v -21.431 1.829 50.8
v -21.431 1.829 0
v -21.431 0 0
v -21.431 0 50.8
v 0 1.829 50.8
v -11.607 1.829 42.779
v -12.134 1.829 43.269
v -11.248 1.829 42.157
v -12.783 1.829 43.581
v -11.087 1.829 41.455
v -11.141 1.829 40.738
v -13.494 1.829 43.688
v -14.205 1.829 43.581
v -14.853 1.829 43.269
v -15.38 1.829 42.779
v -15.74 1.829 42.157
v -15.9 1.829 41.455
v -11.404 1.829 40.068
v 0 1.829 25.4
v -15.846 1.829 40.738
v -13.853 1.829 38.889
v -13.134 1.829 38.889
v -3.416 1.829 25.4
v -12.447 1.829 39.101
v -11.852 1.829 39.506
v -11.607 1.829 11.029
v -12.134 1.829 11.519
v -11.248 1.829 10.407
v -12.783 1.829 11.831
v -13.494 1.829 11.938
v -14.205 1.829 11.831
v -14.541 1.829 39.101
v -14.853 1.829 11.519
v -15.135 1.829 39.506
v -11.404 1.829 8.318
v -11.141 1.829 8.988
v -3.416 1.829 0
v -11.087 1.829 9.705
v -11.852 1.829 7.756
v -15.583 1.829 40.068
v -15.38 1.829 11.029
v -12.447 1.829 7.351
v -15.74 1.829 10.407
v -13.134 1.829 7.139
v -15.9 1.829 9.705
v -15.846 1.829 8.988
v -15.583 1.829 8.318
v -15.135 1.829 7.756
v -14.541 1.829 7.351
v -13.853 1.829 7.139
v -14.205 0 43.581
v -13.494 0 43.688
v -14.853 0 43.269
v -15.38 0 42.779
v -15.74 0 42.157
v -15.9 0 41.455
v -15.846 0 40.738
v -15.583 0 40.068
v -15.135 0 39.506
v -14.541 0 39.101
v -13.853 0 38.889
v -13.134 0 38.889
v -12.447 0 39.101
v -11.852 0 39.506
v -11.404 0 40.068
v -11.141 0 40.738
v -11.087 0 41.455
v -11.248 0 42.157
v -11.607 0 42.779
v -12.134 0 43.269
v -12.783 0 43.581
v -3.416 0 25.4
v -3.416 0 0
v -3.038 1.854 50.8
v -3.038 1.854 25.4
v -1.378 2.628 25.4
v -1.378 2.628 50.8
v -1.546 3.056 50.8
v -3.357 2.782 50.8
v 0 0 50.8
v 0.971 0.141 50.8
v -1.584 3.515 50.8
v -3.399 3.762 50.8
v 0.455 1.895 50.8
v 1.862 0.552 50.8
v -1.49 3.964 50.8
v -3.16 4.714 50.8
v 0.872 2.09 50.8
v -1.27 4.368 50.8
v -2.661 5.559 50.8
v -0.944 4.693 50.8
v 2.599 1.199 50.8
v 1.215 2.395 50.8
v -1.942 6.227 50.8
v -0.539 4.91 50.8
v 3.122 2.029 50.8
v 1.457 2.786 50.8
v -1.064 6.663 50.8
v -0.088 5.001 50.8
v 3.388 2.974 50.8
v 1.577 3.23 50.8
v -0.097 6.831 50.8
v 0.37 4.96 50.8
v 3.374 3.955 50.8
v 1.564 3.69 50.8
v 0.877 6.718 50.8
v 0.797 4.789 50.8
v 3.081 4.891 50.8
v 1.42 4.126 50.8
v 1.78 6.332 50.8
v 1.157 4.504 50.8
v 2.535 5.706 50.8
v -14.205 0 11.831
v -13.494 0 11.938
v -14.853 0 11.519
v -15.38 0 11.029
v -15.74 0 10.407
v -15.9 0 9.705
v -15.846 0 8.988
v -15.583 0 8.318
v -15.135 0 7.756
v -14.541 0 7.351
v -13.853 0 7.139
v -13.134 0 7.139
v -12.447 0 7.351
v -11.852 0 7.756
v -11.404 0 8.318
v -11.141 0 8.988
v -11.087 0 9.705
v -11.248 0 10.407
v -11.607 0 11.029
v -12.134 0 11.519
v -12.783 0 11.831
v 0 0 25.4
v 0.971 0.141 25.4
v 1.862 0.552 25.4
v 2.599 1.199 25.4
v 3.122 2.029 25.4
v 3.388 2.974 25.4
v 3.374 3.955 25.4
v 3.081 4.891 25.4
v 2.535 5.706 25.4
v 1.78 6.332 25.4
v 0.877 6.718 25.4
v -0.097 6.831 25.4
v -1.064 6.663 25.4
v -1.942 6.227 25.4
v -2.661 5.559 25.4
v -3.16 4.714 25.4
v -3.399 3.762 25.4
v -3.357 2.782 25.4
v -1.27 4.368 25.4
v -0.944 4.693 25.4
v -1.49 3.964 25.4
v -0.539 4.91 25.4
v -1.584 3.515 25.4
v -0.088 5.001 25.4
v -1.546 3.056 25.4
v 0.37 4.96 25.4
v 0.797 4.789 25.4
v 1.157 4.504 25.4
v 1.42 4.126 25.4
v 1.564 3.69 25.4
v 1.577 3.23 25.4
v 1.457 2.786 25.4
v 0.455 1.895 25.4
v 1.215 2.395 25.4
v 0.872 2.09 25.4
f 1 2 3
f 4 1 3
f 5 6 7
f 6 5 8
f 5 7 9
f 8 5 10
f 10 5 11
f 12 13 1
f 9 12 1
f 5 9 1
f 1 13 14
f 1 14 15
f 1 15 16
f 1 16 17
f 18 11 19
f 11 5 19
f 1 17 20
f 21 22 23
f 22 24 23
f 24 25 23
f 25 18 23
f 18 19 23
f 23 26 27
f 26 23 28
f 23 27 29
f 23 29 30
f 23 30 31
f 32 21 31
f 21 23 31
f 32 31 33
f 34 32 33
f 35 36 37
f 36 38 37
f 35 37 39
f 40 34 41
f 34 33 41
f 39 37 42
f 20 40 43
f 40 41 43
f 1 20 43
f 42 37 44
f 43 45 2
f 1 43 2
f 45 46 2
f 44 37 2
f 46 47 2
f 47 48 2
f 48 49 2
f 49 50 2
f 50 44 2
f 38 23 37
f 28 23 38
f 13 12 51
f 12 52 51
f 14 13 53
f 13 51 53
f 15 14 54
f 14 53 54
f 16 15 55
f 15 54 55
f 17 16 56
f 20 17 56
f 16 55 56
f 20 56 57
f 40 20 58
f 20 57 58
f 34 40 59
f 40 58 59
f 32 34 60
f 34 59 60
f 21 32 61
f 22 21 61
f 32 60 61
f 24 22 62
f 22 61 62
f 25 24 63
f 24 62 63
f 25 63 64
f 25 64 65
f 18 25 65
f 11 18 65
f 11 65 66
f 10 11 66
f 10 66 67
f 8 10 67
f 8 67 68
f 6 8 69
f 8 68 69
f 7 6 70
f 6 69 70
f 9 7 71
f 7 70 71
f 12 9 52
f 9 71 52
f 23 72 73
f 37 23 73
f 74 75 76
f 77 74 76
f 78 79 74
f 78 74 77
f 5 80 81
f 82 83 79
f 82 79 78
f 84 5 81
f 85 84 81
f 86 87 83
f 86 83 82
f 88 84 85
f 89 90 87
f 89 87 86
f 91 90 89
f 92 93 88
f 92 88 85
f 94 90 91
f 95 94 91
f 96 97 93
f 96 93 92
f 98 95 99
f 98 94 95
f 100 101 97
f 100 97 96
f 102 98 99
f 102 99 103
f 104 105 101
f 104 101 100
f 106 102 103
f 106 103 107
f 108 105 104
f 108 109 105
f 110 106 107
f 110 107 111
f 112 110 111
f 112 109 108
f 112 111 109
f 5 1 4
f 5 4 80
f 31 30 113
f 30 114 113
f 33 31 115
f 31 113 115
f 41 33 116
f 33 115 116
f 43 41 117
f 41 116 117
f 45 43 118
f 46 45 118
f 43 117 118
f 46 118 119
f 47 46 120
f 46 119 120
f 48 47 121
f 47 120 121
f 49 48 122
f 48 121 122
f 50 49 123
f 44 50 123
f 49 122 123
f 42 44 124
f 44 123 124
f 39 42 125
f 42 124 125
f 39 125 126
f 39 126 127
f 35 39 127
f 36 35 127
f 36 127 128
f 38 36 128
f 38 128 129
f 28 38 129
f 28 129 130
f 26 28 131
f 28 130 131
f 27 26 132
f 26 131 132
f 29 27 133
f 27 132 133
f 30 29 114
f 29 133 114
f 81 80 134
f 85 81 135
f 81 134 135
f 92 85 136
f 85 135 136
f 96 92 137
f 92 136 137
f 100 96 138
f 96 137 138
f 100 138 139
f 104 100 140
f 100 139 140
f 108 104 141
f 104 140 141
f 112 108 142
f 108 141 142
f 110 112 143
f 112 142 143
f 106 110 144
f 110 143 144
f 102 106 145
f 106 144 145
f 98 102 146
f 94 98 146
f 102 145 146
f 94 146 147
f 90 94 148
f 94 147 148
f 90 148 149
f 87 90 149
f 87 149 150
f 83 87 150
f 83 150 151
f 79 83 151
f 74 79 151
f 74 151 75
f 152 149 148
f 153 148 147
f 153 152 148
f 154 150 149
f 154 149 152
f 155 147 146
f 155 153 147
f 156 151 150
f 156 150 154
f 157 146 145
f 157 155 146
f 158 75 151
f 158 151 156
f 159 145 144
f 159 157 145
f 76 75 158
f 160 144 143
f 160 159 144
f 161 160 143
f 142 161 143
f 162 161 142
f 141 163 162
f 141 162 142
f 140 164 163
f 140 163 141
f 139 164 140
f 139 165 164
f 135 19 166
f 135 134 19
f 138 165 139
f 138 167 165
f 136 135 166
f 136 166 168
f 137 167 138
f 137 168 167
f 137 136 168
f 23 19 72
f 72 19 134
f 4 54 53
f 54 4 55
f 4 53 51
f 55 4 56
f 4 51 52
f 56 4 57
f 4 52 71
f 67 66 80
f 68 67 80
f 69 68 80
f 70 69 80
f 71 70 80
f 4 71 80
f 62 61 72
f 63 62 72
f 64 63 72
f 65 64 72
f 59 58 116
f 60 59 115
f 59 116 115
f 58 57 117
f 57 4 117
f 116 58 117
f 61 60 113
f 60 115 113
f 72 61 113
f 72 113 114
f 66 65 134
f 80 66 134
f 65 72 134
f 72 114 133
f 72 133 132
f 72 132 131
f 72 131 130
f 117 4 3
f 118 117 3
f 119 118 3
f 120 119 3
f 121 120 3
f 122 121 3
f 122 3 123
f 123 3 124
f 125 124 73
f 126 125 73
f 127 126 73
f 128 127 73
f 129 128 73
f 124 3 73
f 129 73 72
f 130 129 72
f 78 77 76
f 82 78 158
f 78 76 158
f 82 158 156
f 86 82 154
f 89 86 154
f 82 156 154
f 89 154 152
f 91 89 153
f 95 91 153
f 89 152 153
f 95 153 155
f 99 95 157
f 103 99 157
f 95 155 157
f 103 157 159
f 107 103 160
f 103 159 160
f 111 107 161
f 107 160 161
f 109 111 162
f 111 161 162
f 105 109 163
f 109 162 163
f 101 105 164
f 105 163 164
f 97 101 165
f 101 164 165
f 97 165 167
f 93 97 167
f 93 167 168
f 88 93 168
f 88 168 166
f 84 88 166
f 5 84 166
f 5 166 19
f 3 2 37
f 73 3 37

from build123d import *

# Parameters (mm, degrees)
EXTRUDE1_DEPTH                      = 50.8
SKETCH2_W                           = 6.8326
SKETCH2_H                           = 25.4
CUT_EXTRUDE6_DEPTH                  = 56.557383842
EXTRUDE2_DEPTH                      = 50.8
SKETCH4_W                           = 6.8326
SKETCH4_H                           = 25.4
CUT_EXTRUDE7_DEPTH                  = 56.557383842
SKETCH5_R                           = 1.5875
EXTRUDE3_DEPTH                      = 25.4
SKETCH12_W                          = 2.413
SKETCH12_H                          = 1.8288
F_8_0_199_DIAMETER_HOLE1_AT_2_COUNT = 2
F_8_0_199_DIAMETER_HOLE1_AT_2_PITCH = 26.9875
F_8_0_199_DIAMETER_HOLE1_AT_3_COUNT = 2
F_8_0_199_DIAMETER_HOLE1_AT_3_PITCH = 41.669985076
F_8_0_199_DIAMETER_HOLE1_AT_4_COUNT = 2
F_8_0_199_DIAMETER_HOLE1_AT_4_PITCH = 31.75


with BuildPart() as part:
    # Sketch1 → Extrude1 (new body)
    with BuildSketch(Plane.XY):
        with BuildLine():
            Line((-21.43125, 0), (0, 0))
            ThreePointArc((0, 0), (1.779677423, 6.332436821), (-3.038247732, 1.8542))
            Line((-3.038247732, 1.8542), (-1.378132955, 2.628324234))
            ThreePointArc((-1.378132955, 2.628324234), (0.796631885, 4.789447439), (0, 1.8288))
            Line((0, 1.8288), (-21.43125, 1.8288))
            Line((-21.43125, 1.8288), (-21.43125, 0))
        make_face()
    extrude(amount=EXTRUDE1_DEPTH)

    # Sketch2 → Cut-Extrude6 (cut, through all)
    with BuildSketch(Plane(origin=(0, 0, 0), x_dir=(1, 0, 0), z_dir=(0, 1, 0))):
        with Locations((0, -12.7)):
            Rectangle(SKETCH2_W, SKETCH2_H)
    extrude(amount=CUT_EXTRUDE6_DEPTH, mode=Mode.SUBTRACT)


with BuildPart() as body_2:
    # Sketch3 → Extrude2 (new body)
    with BuildSketch(Plane.XY):
        with BuildLine():
            Line((0, 0), (21.43125, 0))
            Line((21.43125, 0), (21.43125, 1.8288))
            Line((21.43125, 1.8288), (3.025053626, 1.8288))
            ThreePointArc((3.025053626, 1.8288), (-1.767445818, 6.339866481), (0, 0))
        make_face()
    extrude(amount=EXTRUDE2_DEPTH)

    # Sketch4 → Cut-Extrude7 (cut, through all)
    with BuildSketch(Plane(origin=(0, 0, 0), x_dir=(1, 0, 0), z_dir=(0, 1, 0))):
        with Locations((0, -38.1)):
            Rectangle(SKETCH4_W, SKETCH4_H)
    extrude(amount=CUT_EXTRUDE7_DEPTH, mode=Mode.SUBTRACT)


with BuildPart() as body_3:
    # Sketch5 → Extrude3 (new body)
    with BuildSketch(Plane(origin=(0, 0, 25.4), x_dir=(-1, 0, 0), z_dir=(0, 0, -1))):
        with Locations((0, 3.4163)):
            Circle(SKETCH5_R)
    extrude(amount=-EXTRUDE3_DEPTH)

    # Sketch9 → Cut-Revolve1 (revolve, cut)
    with BuildSketch(Plane(origin=(0, 3.4163, 0), x_dir=(-1, 0, 0), z_dir=(0, 1, 0)), mode=Mode.PRIVATE) as cut_revolve1_sk:
        Polygon((-0.3175, 50.8), (-1.5875, 49.53), (-1.5875, 50.8), align=None)
    revolve(cut_revolve1_sk.sketch.rotate(Axis((0, 3.4163, 25.4), (0, 0, -1)), 180), axis=Axis((0, 3.4163, 25.4), (0, 0, -1)), mode=Mode.SUBTRACT)


with BuildPart() as body_2_1:
    add(body_2.part)

    # Combine1: union body 3
    add(body_3.part)

    # Sketch12 → #8 (0.199) Diameter Hole1 (revolve, cut)
    with BuildSketch(Plane(origin=(13.49375, 1.8288, 9.525), x_dir=(0, 0, 1), z_dir=(1, 0, 0))):
        with Locations((1.2065, 0.9144)):
            Rectangle(SKETCH12_W, SKETCH12_H)
    f_8_0_199_diameter_hole1 = revolve(axis=Axis((13.49375, 8.1788, 9.525), (0, -1, 0)), mode=Mode.SUBTRACT)

    # #8 (0.199) Diameter Hole1 at 4: #8 (0.199) Diameter Hole1 ×2
    with Locations(*[(0, 0, i * F_8_0_199_DIAMETER_HOLE1_AT_4_PITCH) for i in range(1, F_8_0_199_DIAMETER_HOLE1_AT_4_COUNT)]):
        add(f_8_0_199_diameter_hole1, mode=Mode.SUBTRACT)


with BuildPart() as part_1:
    add(part.part)

    # #8 (0.199) Diameter Hole1 at 2: #8 (0.199) Diameter Hole1 ×2
    with Locations(*[(-i * F_8_0_199_DIAMETER_HOLE1_AT_2_PITCH, 0, 0) for i in range(1, F_8_0_199_DIAMETER_HOLE1_AT_2_COUNT)]):
        add(f_8_0_199_diameter_hole1, mode=Mode.SUBTRACT)

    # #8 (0.199) Diameter Hole1 at 3: #8 (0.199) Diameter Hole1 ×2
    with Locations(*[Vector(-0.6476484200955402, 0, 0.7619393177594594) * (i * F_8_0_199_DIAMETER_HOLE1_AT_3_PITCH) for i in range(1, F_8_0_199_DIAMETER_HOLE1_AT_3_COUNT)]):
        add(f_8_0_199_diameter_hole1, mode=Mode.SUBTRACT)


solid = part_1.part
